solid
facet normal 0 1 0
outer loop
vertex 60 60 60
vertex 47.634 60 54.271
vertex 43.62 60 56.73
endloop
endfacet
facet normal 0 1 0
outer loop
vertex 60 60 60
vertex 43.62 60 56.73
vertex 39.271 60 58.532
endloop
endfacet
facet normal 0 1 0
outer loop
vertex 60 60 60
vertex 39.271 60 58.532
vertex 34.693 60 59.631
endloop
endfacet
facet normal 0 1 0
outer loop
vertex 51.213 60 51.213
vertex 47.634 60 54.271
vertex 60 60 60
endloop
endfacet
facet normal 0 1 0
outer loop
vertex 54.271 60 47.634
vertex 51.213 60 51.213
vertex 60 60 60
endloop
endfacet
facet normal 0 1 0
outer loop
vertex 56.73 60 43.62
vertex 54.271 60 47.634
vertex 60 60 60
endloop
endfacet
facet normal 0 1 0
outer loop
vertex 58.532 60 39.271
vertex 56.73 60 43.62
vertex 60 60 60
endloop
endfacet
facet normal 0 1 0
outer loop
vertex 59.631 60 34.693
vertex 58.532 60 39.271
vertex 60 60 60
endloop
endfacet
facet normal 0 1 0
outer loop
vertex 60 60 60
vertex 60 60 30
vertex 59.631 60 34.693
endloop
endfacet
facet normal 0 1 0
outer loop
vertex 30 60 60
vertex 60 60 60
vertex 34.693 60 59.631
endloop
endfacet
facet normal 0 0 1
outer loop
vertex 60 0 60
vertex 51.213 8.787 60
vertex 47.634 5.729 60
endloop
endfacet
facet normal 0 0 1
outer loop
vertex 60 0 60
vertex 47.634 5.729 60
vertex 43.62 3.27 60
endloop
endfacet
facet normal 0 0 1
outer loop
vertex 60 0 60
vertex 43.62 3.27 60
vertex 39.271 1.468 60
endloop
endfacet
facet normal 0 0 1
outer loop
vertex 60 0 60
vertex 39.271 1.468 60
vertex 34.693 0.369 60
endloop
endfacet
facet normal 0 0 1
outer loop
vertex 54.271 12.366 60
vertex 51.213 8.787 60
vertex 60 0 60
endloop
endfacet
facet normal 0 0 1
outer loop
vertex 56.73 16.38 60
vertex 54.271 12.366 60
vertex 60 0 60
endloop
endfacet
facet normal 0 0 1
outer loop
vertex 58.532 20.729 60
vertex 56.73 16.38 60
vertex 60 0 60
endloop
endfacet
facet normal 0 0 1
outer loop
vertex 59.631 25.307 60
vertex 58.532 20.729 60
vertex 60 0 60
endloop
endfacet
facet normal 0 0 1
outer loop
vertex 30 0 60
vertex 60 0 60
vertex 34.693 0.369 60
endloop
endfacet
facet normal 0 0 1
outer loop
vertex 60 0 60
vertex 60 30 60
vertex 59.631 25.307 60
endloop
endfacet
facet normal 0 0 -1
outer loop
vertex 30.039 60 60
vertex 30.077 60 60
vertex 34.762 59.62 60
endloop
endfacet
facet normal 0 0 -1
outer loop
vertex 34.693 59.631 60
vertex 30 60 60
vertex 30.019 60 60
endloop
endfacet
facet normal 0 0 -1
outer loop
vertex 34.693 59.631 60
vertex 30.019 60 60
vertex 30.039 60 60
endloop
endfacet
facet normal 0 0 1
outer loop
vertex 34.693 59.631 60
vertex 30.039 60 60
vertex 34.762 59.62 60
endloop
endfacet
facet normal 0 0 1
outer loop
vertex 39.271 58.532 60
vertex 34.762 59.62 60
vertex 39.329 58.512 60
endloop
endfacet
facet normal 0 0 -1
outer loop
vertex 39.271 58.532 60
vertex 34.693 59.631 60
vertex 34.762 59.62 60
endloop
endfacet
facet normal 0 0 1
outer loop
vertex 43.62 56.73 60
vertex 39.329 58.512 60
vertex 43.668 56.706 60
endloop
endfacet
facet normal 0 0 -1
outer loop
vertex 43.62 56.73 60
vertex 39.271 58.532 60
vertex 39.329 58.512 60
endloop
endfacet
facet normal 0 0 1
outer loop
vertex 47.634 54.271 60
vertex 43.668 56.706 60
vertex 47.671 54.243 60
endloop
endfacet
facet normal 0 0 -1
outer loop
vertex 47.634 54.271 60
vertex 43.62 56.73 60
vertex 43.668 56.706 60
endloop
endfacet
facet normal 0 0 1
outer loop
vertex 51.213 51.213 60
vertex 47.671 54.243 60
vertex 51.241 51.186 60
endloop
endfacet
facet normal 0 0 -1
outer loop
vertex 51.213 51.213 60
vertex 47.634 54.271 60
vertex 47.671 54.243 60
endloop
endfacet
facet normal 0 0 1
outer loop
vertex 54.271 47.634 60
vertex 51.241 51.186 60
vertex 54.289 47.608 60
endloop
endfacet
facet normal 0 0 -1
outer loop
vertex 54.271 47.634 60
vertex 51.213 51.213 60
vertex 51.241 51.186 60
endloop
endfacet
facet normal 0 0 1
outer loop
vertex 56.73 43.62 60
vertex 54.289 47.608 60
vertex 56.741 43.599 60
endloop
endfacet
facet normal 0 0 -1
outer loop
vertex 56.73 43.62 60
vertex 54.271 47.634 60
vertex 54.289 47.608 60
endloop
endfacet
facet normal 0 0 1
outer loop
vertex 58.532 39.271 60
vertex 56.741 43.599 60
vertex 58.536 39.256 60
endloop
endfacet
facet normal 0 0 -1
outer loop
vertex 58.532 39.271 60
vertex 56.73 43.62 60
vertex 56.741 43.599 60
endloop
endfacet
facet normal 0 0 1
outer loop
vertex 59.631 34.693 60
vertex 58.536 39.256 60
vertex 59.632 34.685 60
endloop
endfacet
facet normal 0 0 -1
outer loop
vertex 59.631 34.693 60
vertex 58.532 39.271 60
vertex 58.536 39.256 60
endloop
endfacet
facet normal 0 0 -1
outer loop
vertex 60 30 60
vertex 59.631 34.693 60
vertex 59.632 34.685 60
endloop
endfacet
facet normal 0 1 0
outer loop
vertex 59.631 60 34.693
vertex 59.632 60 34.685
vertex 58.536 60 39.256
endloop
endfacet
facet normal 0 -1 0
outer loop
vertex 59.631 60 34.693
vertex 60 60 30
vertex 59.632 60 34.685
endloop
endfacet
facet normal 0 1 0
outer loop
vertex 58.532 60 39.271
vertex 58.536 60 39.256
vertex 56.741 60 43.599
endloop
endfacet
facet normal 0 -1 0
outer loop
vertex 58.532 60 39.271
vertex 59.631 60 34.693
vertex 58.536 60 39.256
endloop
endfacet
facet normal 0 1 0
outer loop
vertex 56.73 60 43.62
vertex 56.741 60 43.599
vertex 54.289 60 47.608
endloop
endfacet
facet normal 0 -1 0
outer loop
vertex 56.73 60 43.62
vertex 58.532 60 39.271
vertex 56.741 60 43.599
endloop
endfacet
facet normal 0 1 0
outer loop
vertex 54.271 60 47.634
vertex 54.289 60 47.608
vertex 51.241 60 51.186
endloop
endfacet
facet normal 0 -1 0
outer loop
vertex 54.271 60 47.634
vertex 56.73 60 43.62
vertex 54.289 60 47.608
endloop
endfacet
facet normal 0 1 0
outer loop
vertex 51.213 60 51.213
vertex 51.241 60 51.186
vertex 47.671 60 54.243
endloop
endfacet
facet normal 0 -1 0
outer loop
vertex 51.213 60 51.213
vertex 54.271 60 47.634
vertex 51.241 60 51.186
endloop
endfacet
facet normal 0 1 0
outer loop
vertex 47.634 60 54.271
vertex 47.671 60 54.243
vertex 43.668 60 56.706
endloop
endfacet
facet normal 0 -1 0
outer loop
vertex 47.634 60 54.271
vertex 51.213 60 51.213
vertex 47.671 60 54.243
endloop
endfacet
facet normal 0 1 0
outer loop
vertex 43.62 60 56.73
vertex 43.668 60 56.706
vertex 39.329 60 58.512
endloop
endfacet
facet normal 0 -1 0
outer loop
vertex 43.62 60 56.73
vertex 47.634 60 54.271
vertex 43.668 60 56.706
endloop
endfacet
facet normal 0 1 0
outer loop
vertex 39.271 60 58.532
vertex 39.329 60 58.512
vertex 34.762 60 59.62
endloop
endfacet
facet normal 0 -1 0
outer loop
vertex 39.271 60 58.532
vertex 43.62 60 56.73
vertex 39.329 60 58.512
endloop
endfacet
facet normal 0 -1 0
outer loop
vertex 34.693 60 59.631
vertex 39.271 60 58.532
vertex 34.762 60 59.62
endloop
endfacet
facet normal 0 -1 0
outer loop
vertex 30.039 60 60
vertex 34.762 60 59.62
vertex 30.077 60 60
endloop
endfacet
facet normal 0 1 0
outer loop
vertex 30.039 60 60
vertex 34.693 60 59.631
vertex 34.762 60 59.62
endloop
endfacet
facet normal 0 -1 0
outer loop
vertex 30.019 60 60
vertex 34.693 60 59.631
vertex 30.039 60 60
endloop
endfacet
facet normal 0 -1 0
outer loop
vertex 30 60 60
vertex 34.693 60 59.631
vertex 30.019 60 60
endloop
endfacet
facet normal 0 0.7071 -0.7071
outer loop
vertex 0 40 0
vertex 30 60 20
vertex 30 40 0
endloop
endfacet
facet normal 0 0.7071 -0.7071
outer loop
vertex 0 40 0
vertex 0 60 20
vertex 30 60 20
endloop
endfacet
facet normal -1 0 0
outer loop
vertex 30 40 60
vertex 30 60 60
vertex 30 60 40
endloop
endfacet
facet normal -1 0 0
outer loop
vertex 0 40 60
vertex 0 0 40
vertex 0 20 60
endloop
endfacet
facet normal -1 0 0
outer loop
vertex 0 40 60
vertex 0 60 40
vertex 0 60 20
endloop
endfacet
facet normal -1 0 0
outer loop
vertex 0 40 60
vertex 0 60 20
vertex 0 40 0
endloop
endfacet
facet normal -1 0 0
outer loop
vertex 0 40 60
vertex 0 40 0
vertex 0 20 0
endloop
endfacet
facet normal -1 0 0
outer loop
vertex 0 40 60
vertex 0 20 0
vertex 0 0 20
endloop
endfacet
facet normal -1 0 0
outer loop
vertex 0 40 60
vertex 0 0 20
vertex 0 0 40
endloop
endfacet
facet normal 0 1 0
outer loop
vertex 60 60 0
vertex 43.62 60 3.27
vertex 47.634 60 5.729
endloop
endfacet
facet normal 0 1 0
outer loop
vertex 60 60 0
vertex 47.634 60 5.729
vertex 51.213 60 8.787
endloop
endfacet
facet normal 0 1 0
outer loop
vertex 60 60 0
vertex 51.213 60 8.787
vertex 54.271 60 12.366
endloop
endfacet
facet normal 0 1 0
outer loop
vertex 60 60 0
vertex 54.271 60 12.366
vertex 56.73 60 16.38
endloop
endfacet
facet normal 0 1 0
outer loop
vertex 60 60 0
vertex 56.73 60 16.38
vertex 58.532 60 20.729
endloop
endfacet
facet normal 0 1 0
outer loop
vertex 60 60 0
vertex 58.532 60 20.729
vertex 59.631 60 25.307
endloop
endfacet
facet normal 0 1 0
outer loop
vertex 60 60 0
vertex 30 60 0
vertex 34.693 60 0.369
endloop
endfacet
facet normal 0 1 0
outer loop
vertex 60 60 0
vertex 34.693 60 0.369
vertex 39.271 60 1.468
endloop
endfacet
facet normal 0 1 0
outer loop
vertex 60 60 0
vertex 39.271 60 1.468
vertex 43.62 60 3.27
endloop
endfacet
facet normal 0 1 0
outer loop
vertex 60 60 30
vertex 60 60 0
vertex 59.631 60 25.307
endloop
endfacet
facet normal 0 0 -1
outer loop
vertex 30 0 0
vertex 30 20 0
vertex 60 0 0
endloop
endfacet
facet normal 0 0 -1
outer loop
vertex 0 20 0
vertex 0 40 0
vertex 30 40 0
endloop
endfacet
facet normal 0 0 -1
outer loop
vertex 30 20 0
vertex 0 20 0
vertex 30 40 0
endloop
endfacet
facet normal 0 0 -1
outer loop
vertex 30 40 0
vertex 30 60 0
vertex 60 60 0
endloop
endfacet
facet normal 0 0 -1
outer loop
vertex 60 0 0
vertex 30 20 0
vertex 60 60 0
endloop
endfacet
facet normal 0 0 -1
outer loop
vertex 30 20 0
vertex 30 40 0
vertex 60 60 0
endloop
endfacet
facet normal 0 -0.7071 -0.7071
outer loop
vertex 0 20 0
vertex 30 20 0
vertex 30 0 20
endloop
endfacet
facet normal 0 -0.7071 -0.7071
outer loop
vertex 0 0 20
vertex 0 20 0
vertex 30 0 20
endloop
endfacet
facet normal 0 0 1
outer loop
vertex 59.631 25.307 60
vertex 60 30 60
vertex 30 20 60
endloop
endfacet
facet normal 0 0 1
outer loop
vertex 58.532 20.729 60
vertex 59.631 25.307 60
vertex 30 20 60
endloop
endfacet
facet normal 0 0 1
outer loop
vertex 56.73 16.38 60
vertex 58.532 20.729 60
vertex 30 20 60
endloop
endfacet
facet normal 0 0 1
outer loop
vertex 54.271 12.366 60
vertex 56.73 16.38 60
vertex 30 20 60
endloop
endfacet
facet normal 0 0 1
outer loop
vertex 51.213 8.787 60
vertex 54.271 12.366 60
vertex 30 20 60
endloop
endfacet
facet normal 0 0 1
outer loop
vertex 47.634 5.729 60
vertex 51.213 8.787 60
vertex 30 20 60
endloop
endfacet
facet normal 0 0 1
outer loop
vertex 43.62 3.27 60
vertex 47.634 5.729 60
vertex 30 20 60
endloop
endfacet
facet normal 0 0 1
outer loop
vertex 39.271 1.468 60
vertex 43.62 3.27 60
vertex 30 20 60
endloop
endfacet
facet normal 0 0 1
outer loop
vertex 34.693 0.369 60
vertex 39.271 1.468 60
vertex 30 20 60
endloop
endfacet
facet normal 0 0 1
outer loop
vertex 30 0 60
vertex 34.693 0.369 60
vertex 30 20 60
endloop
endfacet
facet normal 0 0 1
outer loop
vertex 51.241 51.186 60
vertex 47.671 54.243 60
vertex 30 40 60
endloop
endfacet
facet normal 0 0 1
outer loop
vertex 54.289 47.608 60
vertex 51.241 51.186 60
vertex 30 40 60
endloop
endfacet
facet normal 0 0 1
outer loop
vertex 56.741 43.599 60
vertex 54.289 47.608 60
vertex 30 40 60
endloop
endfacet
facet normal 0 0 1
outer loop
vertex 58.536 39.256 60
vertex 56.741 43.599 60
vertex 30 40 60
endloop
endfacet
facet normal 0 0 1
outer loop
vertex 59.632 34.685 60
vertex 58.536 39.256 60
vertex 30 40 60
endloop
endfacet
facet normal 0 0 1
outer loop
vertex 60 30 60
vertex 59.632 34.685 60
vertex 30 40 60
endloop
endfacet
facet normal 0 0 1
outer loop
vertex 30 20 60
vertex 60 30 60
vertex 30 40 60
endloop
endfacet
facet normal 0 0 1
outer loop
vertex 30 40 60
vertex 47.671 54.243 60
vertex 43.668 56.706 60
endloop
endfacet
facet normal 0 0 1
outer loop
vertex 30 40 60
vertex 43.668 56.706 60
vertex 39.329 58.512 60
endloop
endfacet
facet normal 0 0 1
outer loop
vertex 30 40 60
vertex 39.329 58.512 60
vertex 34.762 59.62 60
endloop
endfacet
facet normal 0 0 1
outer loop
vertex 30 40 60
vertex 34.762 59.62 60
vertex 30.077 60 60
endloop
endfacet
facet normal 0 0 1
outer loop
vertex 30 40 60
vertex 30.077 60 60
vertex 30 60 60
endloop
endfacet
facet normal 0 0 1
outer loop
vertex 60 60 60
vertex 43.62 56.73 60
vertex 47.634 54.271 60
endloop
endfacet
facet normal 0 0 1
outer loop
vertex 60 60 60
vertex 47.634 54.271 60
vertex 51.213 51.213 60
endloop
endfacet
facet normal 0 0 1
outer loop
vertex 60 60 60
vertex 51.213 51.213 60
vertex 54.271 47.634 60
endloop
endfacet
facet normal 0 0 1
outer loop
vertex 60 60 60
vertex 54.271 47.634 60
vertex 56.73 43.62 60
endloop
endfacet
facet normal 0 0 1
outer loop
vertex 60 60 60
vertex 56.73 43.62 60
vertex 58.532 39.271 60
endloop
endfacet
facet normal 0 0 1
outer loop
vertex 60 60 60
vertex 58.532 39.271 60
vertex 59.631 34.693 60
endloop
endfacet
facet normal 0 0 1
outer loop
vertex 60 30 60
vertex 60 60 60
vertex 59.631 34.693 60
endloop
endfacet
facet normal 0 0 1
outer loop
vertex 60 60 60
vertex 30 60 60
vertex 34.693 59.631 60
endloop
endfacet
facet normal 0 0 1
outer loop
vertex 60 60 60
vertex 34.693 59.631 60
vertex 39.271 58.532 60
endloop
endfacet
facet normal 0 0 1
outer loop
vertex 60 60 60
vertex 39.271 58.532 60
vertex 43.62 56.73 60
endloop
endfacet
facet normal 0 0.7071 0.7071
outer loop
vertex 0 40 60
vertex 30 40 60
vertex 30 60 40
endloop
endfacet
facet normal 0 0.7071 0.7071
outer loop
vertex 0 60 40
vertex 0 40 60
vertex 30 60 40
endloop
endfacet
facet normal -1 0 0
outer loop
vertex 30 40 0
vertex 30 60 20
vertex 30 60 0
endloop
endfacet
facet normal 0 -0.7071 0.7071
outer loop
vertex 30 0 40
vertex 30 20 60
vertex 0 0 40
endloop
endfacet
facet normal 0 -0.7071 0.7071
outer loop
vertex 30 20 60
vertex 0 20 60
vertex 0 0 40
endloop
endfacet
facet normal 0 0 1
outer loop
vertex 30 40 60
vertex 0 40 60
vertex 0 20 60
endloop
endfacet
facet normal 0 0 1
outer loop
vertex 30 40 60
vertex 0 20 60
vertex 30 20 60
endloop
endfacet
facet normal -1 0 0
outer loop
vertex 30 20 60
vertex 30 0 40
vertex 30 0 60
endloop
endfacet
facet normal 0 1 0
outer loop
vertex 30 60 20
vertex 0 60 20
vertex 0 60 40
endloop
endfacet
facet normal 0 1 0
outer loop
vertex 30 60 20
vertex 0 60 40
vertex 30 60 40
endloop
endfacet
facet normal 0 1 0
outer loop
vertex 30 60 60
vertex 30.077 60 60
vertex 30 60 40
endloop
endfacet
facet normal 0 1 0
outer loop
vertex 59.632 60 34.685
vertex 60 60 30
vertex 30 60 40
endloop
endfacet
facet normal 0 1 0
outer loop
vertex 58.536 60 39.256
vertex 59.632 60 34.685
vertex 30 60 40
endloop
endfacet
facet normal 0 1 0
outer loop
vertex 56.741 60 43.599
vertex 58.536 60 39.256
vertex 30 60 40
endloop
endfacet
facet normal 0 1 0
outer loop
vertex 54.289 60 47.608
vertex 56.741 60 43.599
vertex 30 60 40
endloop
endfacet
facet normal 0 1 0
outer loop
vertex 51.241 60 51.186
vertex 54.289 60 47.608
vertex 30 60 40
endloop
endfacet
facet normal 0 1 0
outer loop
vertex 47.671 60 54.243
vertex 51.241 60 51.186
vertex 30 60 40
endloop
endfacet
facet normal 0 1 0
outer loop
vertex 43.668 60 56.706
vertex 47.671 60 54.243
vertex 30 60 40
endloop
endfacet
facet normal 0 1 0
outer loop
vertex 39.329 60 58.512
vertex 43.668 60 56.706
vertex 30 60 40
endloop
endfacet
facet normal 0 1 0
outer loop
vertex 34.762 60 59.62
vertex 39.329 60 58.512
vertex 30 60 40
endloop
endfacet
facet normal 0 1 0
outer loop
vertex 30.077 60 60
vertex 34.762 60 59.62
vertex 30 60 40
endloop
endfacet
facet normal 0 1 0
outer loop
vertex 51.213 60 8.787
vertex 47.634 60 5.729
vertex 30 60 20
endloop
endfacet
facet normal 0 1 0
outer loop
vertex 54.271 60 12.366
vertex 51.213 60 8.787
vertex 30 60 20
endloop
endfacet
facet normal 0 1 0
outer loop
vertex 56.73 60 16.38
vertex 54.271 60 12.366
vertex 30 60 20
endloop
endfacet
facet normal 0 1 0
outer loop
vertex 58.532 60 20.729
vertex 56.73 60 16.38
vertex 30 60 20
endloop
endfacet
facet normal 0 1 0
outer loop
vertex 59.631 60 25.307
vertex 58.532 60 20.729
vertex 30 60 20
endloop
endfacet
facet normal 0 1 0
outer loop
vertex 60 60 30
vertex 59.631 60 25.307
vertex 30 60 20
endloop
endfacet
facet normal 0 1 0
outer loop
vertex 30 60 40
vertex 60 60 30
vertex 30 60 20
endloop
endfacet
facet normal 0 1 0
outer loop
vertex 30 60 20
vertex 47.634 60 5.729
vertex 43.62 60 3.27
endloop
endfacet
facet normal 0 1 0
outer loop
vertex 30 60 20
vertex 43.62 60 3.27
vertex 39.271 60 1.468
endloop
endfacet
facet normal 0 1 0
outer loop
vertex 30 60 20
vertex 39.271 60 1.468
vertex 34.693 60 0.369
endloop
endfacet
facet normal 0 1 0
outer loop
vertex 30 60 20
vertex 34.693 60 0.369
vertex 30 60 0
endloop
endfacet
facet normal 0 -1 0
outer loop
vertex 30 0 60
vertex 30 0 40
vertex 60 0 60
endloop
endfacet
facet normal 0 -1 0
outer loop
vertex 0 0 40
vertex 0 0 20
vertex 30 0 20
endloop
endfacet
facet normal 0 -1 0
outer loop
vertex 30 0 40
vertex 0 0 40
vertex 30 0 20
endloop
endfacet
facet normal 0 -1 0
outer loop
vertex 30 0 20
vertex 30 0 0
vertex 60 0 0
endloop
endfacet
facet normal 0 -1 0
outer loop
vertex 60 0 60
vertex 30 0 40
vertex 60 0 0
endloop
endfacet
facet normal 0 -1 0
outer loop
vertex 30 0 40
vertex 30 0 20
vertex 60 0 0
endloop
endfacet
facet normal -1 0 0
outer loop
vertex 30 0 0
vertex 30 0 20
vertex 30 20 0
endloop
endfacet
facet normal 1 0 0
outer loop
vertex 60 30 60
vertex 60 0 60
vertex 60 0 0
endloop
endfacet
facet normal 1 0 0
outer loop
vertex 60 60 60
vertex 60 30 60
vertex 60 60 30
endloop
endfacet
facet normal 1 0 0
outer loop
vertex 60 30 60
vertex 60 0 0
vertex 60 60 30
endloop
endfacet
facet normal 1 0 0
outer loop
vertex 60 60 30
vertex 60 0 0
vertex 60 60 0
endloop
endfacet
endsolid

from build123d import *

# Parameters (mm, degrees)
SKETCH1_W           = 60
SKETCH1_H           = 60
BOSS_EXTRUDE1_DEPTH = 60
SKETCH3_W           = 30
SKETCH3_H           = 20
CUT_EXTRUDE1_DEPTH  = 20
SKETCH4_W           = 30
SKETCH4_H           = 20
CUT_EXTRUDE2_DEPTH  = 20
BOSS_EXTRUDE2_DEPTH = 30
CUT_EXTRUDE3_DEPTH  = 30
CUT_EXTRUDE4_DEPTH  = 30
CUT_EXTRUDE6_DEPTH  = 0.0001
CUT_EXTRUDE7_DEPTH  = 0.0001


with BuildPart() as part:
    # Sketch1 → Boss-Extrude1 (new body)
    with BuildSketch(Plane.XY):
        with Locations((30, 30)):
            Rectangle(SKETCH1_W, SKETCH1_H)
    extrude(amount=BOSS_EXTRUDE1_DEPTH)

    # Sketch3 → Cut-Extrude1 (cut)
    with BuildSketch(Plane(origin=(0, 60, 0), x_dir=(1, 0, 0), z_dir=(0, 1, 0))):
        with Locations((15, -10)):
            Rectangle(SKETCH3_W, SKETCH3_H)
    extrude(amount=-CUT_EXTRUDE1_DEPTH, mode=Mode.SUBTRACT)

    # Sketch4 → Cut-Extrude2 (cut)
    with BuildSketch(Plane(origin=(0, 60, 0), x_dir=(1, 0, 0), z_dir=(0, 1, 0))):
        with Locations((15, -50)):
            Rectangle(SKETCH4_W, SKETCH4_H)
    extrude(amount=-CUT_EXTRUDE2_DEPTH, mode=Mode.SUBTRACT)

    # Sketch5 → Boss-Extrude2 (add)
    with BuildSketch(Plane.ZY):
        Polygon((60, 40), (40, 60), (40, 40), align=None)
        Polygon((0, 40), (20, 40), (20, 60), align=None)
    extrude(amount=-BOSS_EXTRUDE2_DEPTH)

    # Sketch6 → Cut-Extrude3 (cut)
    with BuildSketch(Plane.ZY):
        Polygon((60, 20), (40, 0), (60, 0), align=None)
    extrude(amount=-CUT_EXTRUDE3_DEPTH, mode=Mode.SUBTRACT)

    # Sketch7 → Cut-Extrude4 (cut)
    with BuildSketch(Plane.ZY):
        Polygon((0, 20), (20, 0), (0, 0), align=None)
    extrude(amount=-CUT_EXTRUDE4_DEPTH, mode=Mode.SUBTRACT)

    # Sketch8 → Cut-Extrude6 (cut)
    with BuildSketch(Plane(origin=(0, 60, 0), x_dir=(1, 0, 0), z_dir=(0, 1, 0))):
        with BuildLine():
            Line((30, -60), (30, 0))
            ThreePointArc((30, 0), (60, -30), (30, -60))
        make_face()
    extrude(amount=-CUT_EXTRUDE6_DEPTH, mode=Mode.SUBTRACT)

    # Sketch9 → Cut-Extrude7 (cut)
    with BuildSketch(Plane.XY.offset(60)):
        with BuildLine():
            Line((30, 0), (30, 60))
            ThreePointArc((30, 60), (60, 30), (30, 0))
        make_face()
    extrude(amount=-CUT_EXTRUDE7_DEPTH, mode=Mode.SUBTRACT)


solid = part.part
